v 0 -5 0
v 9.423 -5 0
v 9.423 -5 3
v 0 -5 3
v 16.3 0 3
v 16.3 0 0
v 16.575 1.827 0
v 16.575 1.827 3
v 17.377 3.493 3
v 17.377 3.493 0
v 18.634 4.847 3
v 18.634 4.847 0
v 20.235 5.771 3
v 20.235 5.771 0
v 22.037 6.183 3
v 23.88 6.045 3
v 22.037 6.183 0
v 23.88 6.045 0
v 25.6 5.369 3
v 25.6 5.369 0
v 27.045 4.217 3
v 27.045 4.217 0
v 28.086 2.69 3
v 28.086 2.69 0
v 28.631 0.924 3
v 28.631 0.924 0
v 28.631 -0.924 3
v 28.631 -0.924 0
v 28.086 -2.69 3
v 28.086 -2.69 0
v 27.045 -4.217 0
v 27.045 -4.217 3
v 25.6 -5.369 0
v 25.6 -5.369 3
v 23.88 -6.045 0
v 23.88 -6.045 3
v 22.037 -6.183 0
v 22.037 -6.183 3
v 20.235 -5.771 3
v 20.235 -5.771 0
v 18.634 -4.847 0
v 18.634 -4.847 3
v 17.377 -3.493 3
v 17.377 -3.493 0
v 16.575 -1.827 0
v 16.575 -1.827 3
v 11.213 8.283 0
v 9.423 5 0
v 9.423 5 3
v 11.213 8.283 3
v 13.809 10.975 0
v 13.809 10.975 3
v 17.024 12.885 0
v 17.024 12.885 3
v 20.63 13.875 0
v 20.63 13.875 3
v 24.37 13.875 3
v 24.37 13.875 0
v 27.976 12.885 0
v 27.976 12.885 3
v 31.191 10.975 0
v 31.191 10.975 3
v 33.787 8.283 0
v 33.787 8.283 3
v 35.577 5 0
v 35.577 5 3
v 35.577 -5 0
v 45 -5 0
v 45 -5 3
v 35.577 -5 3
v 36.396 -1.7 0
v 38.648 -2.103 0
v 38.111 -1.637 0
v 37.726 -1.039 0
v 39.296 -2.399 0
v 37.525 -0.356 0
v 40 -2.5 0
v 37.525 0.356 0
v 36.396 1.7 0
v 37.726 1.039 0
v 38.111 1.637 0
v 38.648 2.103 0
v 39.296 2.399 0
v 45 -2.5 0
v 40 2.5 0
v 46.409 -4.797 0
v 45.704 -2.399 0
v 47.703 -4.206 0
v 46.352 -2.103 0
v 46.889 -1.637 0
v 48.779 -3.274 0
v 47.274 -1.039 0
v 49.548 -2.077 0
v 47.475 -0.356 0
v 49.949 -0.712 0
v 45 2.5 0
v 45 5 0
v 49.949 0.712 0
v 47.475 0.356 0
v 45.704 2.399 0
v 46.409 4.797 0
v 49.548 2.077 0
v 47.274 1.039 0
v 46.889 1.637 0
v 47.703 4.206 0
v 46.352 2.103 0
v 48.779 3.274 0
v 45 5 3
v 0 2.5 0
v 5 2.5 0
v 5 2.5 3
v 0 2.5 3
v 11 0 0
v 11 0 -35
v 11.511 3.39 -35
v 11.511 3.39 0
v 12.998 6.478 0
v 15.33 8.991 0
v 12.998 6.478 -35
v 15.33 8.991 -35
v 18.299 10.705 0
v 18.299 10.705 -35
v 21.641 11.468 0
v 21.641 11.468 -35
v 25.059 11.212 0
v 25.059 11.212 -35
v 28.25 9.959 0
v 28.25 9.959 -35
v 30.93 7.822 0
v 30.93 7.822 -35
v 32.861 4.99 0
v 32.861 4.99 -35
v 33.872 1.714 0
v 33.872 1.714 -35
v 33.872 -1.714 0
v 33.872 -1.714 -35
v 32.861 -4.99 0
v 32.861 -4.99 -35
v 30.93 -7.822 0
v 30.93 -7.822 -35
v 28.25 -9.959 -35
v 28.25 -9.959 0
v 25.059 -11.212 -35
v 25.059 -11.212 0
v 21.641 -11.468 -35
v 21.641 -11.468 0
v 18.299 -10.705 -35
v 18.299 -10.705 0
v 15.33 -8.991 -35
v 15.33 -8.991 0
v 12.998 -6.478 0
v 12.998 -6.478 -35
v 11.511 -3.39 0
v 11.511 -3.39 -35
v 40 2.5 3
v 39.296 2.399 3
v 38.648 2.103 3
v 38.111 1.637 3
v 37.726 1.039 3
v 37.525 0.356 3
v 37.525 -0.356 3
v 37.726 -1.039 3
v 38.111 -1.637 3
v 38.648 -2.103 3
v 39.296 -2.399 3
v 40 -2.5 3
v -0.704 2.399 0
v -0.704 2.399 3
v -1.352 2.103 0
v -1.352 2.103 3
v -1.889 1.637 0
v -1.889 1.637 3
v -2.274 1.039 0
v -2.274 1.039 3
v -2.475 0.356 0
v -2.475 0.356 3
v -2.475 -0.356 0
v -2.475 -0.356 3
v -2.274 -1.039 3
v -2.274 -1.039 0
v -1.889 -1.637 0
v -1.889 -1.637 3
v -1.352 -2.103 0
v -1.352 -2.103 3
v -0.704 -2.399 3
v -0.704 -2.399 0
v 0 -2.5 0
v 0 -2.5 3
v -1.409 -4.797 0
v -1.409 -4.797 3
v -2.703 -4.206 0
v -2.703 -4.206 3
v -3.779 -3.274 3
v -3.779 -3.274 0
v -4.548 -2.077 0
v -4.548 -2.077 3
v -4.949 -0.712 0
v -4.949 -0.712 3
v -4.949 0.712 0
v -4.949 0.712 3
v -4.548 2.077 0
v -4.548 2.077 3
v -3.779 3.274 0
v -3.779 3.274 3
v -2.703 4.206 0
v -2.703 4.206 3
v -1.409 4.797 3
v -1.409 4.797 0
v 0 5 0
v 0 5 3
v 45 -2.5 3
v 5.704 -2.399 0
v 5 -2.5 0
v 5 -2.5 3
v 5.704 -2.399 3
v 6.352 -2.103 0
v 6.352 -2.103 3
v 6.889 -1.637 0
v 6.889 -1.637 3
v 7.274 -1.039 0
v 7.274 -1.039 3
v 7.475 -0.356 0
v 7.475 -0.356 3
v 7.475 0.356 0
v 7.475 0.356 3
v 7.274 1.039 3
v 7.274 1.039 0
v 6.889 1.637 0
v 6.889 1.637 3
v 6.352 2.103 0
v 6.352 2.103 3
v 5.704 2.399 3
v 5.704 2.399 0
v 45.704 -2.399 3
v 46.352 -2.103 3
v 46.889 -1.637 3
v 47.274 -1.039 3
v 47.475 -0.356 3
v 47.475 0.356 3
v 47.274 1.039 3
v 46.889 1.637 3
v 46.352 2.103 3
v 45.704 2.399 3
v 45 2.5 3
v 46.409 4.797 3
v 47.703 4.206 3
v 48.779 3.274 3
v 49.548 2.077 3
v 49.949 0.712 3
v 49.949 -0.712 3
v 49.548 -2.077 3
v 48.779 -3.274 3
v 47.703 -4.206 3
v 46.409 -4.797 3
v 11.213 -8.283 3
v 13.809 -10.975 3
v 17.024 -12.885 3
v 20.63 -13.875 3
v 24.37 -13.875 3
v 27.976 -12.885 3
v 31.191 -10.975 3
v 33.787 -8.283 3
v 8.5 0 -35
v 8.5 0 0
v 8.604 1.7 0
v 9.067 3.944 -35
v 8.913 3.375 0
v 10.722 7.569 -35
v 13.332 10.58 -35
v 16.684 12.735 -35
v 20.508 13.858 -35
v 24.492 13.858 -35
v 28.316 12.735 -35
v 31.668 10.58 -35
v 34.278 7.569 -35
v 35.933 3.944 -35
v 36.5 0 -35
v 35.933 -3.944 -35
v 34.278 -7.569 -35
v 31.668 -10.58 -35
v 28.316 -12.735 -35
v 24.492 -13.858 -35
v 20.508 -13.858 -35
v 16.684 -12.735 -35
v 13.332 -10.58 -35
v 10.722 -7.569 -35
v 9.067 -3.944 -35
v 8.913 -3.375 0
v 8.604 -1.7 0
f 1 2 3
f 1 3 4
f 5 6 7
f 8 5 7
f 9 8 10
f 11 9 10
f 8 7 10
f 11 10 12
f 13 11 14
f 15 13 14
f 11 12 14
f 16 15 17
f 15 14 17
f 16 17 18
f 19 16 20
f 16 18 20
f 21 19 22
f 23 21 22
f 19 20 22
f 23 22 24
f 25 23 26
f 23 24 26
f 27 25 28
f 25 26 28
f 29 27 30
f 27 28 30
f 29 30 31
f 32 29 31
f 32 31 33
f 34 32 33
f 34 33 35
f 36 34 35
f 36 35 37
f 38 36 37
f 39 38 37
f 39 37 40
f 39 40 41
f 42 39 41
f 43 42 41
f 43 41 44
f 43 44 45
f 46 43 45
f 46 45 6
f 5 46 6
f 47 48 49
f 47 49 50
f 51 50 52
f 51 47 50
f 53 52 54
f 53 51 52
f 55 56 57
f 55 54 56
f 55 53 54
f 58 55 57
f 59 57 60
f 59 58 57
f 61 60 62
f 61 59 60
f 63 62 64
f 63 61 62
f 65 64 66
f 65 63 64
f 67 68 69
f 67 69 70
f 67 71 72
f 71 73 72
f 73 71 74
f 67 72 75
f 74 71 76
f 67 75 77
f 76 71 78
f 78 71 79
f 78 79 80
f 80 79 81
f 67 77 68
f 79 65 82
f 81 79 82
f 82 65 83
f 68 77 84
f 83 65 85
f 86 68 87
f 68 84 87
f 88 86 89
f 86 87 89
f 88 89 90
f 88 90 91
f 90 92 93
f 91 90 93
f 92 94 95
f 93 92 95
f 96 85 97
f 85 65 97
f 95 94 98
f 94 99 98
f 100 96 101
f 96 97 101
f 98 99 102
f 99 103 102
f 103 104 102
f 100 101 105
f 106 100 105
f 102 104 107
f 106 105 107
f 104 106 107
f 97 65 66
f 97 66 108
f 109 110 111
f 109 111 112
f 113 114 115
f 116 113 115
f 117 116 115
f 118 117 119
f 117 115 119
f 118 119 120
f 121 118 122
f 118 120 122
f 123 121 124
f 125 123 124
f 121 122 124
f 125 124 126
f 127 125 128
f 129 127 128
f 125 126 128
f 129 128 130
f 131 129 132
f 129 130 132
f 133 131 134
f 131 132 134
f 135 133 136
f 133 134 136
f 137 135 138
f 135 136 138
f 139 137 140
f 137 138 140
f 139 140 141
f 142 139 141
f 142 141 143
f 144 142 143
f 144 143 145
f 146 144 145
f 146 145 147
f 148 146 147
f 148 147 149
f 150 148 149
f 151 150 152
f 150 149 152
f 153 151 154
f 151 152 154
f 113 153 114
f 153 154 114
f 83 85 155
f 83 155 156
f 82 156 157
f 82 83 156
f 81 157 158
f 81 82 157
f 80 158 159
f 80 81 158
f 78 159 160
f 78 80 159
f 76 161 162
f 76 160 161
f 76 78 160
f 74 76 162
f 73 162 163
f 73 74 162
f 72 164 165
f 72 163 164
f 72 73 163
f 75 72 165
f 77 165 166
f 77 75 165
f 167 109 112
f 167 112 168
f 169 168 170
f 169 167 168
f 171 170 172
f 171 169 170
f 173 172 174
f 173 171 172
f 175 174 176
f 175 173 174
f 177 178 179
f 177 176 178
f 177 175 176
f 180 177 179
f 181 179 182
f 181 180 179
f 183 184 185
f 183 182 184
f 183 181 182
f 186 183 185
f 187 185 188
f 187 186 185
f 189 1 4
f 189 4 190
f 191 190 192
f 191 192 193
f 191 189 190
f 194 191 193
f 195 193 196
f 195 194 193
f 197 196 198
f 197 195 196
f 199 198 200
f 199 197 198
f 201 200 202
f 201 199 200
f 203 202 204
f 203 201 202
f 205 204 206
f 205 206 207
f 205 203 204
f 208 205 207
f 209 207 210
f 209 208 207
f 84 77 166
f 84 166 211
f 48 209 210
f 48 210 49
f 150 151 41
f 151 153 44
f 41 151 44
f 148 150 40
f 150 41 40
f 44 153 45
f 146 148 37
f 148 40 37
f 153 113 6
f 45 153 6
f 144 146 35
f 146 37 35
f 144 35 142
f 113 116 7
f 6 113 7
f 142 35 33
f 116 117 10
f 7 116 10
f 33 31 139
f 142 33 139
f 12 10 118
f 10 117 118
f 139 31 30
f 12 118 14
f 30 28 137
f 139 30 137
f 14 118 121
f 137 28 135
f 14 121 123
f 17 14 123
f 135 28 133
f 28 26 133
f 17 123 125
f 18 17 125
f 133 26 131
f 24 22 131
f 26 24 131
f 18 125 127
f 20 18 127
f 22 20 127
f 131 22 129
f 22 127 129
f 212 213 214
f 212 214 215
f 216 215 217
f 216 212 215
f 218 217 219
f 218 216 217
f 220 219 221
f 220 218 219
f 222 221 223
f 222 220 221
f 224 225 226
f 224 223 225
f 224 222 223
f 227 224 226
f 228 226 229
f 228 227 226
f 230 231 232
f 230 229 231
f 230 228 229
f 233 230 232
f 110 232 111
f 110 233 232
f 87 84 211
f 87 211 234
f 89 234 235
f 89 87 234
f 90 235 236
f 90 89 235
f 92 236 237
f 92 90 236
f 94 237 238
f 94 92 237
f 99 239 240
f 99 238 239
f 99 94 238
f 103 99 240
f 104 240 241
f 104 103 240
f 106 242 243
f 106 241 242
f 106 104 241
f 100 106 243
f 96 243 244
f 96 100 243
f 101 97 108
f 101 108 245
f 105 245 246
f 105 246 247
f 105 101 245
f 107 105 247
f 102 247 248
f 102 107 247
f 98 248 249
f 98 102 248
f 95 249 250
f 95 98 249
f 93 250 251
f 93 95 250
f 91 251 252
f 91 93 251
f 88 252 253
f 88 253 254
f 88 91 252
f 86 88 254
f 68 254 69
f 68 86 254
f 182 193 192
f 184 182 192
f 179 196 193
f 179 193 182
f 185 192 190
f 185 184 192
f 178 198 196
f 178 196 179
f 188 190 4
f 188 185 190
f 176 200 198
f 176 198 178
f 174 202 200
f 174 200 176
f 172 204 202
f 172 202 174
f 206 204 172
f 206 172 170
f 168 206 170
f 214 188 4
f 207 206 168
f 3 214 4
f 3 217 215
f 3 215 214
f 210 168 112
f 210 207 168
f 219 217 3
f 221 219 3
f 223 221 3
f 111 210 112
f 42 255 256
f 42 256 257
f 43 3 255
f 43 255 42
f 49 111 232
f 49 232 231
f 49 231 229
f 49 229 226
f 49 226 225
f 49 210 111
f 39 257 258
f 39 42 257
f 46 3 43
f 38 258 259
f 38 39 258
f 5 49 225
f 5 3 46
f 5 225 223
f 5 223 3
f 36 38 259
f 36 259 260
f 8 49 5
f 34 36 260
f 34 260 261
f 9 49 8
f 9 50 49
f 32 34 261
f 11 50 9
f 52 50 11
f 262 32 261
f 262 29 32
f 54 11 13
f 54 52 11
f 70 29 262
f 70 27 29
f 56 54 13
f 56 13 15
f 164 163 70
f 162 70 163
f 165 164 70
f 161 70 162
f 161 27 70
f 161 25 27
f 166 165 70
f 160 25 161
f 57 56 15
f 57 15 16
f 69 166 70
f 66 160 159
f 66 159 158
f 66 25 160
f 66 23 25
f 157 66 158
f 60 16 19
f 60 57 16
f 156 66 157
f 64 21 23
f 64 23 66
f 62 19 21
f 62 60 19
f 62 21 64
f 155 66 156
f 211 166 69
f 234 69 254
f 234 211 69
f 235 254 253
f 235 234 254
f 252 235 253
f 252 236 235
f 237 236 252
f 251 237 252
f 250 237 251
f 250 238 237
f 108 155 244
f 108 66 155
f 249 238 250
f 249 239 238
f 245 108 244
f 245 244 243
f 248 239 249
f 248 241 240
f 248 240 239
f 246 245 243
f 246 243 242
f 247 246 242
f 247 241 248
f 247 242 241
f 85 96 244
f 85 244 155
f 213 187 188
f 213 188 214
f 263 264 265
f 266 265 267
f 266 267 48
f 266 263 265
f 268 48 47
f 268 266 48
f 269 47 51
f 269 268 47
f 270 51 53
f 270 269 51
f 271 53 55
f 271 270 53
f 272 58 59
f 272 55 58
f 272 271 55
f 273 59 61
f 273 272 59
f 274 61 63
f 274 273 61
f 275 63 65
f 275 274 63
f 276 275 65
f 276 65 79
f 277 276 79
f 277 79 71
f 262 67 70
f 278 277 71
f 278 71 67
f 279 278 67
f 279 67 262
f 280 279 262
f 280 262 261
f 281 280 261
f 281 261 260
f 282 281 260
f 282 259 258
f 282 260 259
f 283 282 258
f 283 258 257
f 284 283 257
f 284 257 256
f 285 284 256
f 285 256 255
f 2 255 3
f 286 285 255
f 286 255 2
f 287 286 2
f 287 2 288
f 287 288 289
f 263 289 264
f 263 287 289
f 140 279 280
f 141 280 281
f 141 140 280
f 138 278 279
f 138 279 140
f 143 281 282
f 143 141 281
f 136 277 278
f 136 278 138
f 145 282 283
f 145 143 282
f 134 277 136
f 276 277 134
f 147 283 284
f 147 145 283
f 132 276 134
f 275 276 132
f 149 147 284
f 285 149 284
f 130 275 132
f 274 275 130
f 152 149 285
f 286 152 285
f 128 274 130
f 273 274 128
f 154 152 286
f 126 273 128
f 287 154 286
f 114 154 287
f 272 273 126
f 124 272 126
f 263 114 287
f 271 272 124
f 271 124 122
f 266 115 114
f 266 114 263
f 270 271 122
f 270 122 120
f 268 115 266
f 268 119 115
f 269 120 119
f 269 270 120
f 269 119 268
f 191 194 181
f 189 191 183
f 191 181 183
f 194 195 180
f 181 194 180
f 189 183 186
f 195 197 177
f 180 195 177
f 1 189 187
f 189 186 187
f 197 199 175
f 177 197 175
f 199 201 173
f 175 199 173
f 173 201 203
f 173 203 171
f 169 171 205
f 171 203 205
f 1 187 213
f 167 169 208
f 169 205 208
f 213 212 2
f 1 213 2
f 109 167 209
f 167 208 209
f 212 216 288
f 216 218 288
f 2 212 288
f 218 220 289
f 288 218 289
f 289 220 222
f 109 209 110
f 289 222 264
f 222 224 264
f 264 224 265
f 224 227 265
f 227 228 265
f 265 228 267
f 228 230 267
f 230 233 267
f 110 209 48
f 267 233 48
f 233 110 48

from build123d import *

# Parameters (mm, degrees)
SKETCH1_R           = 14
BOSS_EXTRUDE1_DEPTH = 3
SKETCH2_R           = 6.2
CUT_EXTRUDE1_DEPTH  = 8
BOSS_EXTRUDE2_START = 35
SKETCH3_R           = 14
SKETCH3_R_2         = 11.5
BOSS_EXTRUDE2_DEPTH = 35
CUT_EXTRUDE2_DEPTH  = 63.617888818


with BuildPart() as part:
    # Sketch1 → Boss-Extrude1 (new body)
    with BuildSketch(Plane.XY):
        with Locations((22.5, 0)):
            Circle(SKETCH1_R)
        with BuildLine():
            Line((0, 5), (45, 5))
            ThreePointArc((45, 5), (50, 0), (45, -5))
            Line((45, -5), (0, -5))
            ThreePointArc((0, -5), (-5, 0), (0, 5))
        make_face()
    extrude(amount=BOSS_EXTRUDE1_DEPTH)

    # Sketch2 → Cut-Extrude1 (cut)
    with BuildSketch(Plane(origin=(0, 0, 0), x_dir=(-1, 0, 0), z_dir=(0, 0, -1))):
        with Locations((-22.5, 0)):
            Circle(SKETCH2_R)
    extrude(amount=-CUT_EXTRUDE1_DEPTH, mode=Mode.SUBTRACT)

    # Sketch3 → Boss-Extrude2 (add)
    with BuildSketch(Plane(origin=(0, 0, 0), x_dir=(-1, 0, 0), z_dir=(0, 0, -1)).offset(BOSS_EXTRUDE2_START)):
        with Locations((-22.5, 0)):
            Circle(SKETCH3_R)
        with Locations((-22.5, 0)):
            Circle(SKETCH3_R_2, mode=Mode.SUBTRACT)
    extrude(amount=-BOSS_EXTRUDE2_DEPTH)

    # Sketch4 → Cut-Extrude2 (cut, through all)
    with BuildSketch(Plane(origin=(0, 0, 0), x_dir=(-1, 0, 0), z_dir=(0, 0, -1))):
        with BuildLine():
            Line((-40, -2.5), (-45, -2.5))
            ThreePointArc((-45, -2.5), (-47.5, 0), (-45, 2.5))
            Line((-45, 2.5), (-40, 2.5))
            ThreePointArc((-40, 2.5), (-37.5, 0), (-40, -2.5))
        make_face()
        with BuildLine():
            Line((-5, 2.5), (0, 2.5))
            ThreePointArc((0, 2.5), (2.5, 0), (0, -2.5))
            Line((0, -2.5), (-5, -2.5))
            ThreePointArc((-5, -2.5), (-7.5, 0), (-5, 2.5))
        make_face()
    extrude(amount=-CUT_EXTRUDE2_DEPTH, mode=Mode.SUBTRACT)


solid = part.part
